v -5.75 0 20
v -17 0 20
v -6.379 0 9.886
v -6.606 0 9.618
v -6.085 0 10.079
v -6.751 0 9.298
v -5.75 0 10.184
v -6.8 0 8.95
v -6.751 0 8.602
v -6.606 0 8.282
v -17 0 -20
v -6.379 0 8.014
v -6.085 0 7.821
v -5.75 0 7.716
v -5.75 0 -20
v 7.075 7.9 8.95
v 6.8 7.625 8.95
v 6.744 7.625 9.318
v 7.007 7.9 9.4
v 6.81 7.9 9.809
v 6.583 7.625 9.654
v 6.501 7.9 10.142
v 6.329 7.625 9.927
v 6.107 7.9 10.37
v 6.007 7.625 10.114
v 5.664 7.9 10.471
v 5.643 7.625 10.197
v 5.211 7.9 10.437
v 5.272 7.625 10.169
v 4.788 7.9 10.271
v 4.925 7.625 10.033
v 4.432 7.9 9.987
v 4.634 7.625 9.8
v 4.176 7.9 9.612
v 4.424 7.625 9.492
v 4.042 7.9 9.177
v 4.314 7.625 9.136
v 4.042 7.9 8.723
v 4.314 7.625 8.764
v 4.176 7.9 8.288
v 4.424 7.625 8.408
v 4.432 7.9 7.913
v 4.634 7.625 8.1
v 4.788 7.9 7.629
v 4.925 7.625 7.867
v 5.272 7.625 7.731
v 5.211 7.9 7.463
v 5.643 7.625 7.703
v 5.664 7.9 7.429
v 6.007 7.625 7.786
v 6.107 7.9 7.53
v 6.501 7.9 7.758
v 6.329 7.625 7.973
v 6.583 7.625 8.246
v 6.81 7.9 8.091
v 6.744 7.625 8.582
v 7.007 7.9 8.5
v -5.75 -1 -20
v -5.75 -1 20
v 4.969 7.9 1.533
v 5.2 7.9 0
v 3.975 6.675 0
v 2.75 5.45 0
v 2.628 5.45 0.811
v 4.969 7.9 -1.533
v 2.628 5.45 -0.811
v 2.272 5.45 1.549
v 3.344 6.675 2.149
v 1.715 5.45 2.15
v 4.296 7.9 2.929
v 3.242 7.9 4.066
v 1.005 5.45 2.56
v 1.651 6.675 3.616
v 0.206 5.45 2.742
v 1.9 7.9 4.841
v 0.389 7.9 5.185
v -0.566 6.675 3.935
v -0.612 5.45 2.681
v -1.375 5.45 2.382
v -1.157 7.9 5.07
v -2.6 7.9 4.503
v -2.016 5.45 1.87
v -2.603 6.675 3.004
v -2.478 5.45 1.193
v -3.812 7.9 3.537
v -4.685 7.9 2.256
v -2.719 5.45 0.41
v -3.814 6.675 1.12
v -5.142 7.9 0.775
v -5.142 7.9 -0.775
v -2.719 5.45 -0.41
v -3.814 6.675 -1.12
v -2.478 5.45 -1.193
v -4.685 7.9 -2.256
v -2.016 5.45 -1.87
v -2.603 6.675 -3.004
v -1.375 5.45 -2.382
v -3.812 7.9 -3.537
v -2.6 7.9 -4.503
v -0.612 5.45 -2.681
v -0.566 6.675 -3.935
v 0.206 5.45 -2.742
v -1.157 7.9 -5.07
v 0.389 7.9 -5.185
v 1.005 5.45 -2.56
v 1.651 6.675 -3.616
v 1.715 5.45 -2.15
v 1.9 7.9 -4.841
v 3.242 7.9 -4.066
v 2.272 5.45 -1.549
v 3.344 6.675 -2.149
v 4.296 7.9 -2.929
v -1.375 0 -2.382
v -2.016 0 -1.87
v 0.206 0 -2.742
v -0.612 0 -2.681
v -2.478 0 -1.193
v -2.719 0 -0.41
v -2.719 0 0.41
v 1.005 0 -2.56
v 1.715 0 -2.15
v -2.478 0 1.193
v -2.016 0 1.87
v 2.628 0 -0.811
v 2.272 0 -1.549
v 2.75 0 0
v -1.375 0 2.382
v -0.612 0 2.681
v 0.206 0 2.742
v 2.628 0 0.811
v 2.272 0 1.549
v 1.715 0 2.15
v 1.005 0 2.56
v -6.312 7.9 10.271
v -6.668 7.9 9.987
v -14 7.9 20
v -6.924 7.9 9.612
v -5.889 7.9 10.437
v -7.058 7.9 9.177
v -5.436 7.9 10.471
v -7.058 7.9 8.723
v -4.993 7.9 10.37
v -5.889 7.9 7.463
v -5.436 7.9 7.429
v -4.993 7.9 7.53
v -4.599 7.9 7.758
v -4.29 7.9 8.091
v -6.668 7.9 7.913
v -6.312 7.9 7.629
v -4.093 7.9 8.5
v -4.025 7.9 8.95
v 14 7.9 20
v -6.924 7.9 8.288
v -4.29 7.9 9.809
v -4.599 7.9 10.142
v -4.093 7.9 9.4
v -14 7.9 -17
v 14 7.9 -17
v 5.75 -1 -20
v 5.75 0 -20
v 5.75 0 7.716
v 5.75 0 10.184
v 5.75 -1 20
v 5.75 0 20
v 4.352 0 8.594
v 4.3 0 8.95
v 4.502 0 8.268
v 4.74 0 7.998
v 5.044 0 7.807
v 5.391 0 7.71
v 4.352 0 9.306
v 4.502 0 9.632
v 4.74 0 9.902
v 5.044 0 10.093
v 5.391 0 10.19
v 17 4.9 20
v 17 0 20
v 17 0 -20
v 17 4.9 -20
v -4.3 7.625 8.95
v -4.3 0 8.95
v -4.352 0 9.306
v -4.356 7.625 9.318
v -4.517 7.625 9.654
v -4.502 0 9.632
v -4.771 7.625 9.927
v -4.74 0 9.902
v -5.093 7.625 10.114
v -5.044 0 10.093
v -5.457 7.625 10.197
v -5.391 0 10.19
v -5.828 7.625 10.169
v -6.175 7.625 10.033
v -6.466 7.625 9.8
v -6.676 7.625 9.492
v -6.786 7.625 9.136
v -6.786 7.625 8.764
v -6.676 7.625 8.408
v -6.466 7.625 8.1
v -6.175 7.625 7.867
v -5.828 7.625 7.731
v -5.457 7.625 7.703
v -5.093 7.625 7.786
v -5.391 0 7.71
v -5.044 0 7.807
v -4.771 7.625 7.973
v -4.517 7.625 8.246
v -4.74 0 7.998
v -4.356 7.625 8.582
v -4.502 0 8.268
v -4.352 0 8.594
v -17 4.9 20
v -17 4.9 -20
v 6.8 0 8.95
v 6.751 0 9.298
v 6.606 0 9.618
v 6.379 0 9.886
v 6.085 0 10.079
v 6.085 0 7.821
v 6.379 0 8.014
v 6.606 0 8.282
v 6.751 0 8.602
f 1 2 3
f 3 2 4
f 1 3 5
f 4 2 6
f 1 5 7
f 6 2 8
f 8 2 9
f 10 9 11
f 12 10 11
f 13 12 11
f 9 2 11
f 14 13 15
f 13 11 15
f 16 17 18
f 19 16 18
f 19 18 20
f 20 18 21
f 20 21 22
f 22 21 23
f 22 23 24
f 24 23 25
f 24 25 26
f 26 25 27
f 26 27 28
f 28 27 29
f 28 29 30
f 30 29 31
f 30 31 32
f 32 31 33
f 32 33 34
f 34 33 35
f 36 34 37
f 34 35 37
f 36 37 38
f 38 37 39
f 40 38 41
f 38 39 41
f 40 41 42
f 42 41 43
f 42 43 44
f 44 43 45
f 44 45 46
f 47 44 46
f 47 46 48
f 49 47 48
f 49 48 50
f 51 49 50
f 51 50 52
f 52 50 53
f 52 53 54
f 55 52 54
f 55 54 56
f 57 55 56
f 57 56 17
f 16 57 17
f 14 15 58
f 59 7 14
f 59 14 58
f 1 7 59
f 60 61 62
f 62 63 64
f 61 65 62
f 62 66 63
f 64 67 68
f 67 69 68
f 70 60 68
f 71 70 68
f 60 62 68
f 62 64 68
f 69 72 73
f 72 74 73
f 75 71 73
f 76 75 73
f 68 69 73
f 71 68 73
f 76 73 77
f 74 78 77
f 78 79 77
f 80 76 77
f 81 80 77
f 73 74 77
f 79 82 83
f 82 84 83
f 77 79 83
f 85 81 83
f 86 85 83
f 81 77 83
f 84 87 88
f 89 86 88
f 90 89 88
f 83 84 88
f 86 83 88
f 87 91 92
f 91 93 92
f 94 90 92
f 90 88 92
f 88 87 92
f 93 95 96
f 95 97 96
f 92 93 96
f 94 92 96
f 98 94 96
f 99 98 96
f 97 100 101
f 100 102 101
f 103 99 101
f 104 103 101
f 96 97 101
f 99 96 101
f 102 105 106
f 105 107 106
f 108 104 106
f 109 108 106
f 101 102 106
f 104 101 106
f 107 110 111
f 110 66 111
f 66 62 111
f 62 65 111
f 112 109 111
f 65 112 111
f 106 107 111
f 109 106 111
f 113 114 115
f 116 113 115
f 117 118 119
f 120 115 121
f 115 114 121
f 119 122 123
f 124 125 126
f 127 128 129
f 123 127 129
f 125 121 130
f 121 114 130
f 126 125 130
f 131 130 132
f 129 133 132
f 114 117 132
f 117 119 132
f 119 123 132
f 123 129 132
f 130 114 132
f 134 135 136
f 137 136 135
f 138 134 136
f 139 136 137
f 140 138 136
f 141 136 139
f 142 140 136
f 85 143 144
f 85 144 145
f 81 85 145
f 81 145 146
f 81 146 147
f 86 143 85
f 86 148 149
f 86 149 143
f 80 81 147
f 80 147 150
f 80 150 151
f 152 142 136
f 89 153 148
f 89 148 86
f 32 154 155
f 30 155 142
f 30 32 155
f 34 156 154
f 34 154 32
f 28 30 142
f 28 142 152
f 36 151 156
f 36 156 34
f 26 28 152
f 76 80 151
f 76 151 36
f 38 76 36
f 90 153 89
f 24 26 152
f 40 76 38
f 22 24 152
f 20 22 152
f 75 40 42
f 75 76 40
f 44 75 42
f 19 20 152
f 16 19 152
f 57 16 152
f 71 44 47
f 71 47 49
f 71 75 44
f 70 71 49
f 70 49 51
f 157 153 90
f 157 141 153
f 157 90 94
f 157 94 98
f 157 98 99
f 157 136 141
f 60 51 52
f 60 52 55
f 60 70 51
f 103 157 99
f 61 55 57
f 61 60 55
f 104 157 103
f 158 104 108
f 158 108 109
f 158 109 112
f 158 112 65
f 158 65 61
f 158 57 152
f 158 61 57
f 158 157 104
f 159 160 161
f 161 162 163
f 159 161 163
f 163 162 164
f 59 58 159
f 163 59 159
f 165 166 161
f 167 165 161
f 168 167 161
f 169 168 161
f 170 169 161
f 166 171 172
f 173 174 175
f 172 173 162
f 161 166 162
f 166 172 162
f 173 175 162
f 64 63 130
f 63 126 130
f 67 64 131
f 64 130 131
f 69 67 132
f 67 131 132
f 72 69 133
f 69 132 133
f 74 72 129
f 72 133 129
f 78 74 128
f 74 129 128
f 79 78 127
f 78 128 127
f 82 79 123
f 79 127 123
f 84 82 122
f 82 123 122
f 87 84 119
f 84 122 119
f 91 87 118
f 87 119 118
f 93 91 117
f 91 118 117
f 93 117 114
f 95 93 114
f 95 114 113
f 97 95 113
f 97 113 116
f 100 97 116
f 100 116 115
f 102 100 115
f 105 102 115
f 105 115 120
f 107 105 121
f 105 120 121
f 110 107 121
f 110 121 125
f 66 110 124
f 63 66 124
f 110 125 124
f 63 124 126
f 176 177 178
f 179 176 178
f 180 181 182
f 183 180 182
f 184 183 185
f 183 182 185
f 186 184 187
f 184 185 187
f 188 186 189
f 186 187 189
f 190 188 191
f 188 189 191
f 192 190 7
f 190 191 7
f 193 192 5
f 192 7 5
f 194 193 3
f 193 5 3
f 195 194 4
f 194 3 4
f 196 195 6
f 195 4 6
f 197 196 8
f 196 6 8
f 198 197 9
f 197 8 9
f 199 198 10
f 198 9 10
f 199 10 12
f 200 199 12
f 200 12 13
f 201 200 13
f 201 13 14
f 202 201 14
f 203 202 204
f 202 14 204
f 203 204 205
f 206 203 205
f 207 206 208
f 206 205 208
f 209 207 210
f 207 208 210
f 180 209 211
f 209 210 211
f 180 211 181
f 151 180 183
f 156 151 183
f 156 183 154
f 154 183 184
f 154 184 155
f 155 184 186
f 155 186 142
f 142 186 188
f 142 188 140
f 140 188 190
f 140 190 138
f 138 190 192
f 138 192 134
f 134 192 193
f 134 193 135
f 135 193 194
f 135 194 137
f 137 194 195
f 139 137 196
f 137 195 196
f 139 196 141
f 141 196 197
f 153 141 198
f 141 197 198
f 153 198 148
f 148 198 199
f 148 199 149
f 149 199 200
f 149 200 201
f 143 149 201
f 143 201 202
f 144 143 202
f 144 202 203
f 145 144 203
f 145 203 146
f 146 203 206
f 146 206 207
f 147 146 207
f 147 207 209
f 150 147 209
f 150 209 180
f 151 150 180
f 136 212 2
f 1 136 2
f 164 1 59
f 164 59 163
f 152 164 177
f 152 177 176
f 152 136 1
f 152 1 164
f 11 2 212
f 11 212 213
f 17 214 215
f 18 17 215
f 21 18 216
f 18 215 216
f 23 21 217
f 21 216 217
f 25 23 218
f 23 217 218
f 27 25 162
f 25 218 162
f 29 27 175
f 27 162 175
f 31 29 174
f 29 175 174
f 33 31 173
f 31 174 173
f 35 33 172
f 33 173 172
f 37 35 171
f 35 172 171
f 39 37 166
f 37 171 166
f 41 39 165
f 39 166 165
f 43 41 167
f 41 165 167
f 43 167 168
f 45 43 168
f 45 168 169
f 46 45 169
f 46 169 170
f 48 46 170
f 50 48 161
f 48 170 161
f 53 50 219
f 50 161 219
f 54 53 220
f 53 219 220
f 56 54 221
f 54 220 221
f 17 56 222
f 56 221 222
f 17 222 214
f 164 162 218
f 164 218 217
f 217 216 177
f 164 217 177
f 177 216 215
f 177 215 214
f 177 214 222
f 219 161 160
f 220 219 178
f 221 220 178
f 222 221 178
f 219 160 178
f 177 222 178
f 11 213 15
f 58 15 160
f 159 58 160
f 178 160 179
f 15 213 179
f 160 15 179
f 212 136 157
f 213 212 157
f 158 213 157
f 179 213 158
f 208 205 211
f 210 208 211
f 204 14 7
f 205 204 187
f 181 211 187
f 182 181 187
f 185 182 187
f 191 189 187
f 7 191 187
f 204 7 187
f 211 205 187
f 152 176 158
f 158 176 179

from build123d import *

# Parameters (mm, degrees)
SKETCH_1_W                    = 34
SKETCH_1_H                    = 40
EXTRUDE_326_DEPTH             = 7.9
HOLE_WIZARD_40_M5_D           = 5.5
HOLE_WIZARD_40_M5_CSINK_D     = 10.4
HOLE_WIZARD_40_M5_CSINK_ANGLE = 90
HOLE_WIZARD_M3_D              = 2.5
HOLE_WIZARD_M3_CSINK_D        = 3.05
HOLE_WIZARD_M3_CSINK_ANGLE    = 90
CHAMFER_1_SIZE                = 3
SKETCH_7_W                    = 11.5
SKETCH_7_H                    = 40
EXTRUDE_40_DEPTH              = 1


with BuildPart() as part:
    # Эскиз1 → Extrude 326 (new body)
    with BuildSketch(Plane(origin=(0, 0, 0), x_dir=(1, 0, 0), z_dir=(0, 1, 0))):
        Rectangle(SKETCH_1_W, SKETCH_1_H)
    extrude(amount=EXTRUDE_326_DEPTH)

    # Крепление к профилю 40 - M5 (through all)
    with Locations(Plane(origin=(0, 7.9, 0), x_dir=(-1, 0, 0), z_dir=(0, 1, 0))):
        with Locations((0, 0)):
            CounterSinkHole(HOLE_WIZARD_40_M5_D / 2, HOLE_WIZARD_40_M5_CSINK_D / 2, counter_sink_angle=HOLE_WIZARD_40_M5_CSINK_ANGLE)

    # Крепление датчика M3 (through all)
    with Locations(Plane(origin=(0, 7.9, 0), x_dir=(-1, 0, 0), z_dir=(0, 1, 0))):
        with Locations((5.55, 8.95), (-5.55, 8.95)):
            CounterSinkHole(HOLE_WIZARD_M3_D / 2, HOLE_WIZARD_M3_CSINK_D / 2, counter_sink_angle=HOLE_WIZARD_M3_CSINK_ANGLE)

    # Фаска1
    chamfer_1_edges = [part.edges().sort_by_distance(p)[0] for p in [
        (-17, 7.9, 0),
        (17, 7.9, 0),
        (0, 7.9, -20),
    ]]
    chamfer(chamfer_1_edges, length=CHAMFER_1_SIZE)

    # Эскиз7 → Направляющая профиля 40 (add)
    with BuildSketch(Plane.XZ):
        Rectangle(SKETCH_7_W, SKETCH_7_H)
    extrude(amount=EXTRUDE_40_DEPTH)


solid = part.part
